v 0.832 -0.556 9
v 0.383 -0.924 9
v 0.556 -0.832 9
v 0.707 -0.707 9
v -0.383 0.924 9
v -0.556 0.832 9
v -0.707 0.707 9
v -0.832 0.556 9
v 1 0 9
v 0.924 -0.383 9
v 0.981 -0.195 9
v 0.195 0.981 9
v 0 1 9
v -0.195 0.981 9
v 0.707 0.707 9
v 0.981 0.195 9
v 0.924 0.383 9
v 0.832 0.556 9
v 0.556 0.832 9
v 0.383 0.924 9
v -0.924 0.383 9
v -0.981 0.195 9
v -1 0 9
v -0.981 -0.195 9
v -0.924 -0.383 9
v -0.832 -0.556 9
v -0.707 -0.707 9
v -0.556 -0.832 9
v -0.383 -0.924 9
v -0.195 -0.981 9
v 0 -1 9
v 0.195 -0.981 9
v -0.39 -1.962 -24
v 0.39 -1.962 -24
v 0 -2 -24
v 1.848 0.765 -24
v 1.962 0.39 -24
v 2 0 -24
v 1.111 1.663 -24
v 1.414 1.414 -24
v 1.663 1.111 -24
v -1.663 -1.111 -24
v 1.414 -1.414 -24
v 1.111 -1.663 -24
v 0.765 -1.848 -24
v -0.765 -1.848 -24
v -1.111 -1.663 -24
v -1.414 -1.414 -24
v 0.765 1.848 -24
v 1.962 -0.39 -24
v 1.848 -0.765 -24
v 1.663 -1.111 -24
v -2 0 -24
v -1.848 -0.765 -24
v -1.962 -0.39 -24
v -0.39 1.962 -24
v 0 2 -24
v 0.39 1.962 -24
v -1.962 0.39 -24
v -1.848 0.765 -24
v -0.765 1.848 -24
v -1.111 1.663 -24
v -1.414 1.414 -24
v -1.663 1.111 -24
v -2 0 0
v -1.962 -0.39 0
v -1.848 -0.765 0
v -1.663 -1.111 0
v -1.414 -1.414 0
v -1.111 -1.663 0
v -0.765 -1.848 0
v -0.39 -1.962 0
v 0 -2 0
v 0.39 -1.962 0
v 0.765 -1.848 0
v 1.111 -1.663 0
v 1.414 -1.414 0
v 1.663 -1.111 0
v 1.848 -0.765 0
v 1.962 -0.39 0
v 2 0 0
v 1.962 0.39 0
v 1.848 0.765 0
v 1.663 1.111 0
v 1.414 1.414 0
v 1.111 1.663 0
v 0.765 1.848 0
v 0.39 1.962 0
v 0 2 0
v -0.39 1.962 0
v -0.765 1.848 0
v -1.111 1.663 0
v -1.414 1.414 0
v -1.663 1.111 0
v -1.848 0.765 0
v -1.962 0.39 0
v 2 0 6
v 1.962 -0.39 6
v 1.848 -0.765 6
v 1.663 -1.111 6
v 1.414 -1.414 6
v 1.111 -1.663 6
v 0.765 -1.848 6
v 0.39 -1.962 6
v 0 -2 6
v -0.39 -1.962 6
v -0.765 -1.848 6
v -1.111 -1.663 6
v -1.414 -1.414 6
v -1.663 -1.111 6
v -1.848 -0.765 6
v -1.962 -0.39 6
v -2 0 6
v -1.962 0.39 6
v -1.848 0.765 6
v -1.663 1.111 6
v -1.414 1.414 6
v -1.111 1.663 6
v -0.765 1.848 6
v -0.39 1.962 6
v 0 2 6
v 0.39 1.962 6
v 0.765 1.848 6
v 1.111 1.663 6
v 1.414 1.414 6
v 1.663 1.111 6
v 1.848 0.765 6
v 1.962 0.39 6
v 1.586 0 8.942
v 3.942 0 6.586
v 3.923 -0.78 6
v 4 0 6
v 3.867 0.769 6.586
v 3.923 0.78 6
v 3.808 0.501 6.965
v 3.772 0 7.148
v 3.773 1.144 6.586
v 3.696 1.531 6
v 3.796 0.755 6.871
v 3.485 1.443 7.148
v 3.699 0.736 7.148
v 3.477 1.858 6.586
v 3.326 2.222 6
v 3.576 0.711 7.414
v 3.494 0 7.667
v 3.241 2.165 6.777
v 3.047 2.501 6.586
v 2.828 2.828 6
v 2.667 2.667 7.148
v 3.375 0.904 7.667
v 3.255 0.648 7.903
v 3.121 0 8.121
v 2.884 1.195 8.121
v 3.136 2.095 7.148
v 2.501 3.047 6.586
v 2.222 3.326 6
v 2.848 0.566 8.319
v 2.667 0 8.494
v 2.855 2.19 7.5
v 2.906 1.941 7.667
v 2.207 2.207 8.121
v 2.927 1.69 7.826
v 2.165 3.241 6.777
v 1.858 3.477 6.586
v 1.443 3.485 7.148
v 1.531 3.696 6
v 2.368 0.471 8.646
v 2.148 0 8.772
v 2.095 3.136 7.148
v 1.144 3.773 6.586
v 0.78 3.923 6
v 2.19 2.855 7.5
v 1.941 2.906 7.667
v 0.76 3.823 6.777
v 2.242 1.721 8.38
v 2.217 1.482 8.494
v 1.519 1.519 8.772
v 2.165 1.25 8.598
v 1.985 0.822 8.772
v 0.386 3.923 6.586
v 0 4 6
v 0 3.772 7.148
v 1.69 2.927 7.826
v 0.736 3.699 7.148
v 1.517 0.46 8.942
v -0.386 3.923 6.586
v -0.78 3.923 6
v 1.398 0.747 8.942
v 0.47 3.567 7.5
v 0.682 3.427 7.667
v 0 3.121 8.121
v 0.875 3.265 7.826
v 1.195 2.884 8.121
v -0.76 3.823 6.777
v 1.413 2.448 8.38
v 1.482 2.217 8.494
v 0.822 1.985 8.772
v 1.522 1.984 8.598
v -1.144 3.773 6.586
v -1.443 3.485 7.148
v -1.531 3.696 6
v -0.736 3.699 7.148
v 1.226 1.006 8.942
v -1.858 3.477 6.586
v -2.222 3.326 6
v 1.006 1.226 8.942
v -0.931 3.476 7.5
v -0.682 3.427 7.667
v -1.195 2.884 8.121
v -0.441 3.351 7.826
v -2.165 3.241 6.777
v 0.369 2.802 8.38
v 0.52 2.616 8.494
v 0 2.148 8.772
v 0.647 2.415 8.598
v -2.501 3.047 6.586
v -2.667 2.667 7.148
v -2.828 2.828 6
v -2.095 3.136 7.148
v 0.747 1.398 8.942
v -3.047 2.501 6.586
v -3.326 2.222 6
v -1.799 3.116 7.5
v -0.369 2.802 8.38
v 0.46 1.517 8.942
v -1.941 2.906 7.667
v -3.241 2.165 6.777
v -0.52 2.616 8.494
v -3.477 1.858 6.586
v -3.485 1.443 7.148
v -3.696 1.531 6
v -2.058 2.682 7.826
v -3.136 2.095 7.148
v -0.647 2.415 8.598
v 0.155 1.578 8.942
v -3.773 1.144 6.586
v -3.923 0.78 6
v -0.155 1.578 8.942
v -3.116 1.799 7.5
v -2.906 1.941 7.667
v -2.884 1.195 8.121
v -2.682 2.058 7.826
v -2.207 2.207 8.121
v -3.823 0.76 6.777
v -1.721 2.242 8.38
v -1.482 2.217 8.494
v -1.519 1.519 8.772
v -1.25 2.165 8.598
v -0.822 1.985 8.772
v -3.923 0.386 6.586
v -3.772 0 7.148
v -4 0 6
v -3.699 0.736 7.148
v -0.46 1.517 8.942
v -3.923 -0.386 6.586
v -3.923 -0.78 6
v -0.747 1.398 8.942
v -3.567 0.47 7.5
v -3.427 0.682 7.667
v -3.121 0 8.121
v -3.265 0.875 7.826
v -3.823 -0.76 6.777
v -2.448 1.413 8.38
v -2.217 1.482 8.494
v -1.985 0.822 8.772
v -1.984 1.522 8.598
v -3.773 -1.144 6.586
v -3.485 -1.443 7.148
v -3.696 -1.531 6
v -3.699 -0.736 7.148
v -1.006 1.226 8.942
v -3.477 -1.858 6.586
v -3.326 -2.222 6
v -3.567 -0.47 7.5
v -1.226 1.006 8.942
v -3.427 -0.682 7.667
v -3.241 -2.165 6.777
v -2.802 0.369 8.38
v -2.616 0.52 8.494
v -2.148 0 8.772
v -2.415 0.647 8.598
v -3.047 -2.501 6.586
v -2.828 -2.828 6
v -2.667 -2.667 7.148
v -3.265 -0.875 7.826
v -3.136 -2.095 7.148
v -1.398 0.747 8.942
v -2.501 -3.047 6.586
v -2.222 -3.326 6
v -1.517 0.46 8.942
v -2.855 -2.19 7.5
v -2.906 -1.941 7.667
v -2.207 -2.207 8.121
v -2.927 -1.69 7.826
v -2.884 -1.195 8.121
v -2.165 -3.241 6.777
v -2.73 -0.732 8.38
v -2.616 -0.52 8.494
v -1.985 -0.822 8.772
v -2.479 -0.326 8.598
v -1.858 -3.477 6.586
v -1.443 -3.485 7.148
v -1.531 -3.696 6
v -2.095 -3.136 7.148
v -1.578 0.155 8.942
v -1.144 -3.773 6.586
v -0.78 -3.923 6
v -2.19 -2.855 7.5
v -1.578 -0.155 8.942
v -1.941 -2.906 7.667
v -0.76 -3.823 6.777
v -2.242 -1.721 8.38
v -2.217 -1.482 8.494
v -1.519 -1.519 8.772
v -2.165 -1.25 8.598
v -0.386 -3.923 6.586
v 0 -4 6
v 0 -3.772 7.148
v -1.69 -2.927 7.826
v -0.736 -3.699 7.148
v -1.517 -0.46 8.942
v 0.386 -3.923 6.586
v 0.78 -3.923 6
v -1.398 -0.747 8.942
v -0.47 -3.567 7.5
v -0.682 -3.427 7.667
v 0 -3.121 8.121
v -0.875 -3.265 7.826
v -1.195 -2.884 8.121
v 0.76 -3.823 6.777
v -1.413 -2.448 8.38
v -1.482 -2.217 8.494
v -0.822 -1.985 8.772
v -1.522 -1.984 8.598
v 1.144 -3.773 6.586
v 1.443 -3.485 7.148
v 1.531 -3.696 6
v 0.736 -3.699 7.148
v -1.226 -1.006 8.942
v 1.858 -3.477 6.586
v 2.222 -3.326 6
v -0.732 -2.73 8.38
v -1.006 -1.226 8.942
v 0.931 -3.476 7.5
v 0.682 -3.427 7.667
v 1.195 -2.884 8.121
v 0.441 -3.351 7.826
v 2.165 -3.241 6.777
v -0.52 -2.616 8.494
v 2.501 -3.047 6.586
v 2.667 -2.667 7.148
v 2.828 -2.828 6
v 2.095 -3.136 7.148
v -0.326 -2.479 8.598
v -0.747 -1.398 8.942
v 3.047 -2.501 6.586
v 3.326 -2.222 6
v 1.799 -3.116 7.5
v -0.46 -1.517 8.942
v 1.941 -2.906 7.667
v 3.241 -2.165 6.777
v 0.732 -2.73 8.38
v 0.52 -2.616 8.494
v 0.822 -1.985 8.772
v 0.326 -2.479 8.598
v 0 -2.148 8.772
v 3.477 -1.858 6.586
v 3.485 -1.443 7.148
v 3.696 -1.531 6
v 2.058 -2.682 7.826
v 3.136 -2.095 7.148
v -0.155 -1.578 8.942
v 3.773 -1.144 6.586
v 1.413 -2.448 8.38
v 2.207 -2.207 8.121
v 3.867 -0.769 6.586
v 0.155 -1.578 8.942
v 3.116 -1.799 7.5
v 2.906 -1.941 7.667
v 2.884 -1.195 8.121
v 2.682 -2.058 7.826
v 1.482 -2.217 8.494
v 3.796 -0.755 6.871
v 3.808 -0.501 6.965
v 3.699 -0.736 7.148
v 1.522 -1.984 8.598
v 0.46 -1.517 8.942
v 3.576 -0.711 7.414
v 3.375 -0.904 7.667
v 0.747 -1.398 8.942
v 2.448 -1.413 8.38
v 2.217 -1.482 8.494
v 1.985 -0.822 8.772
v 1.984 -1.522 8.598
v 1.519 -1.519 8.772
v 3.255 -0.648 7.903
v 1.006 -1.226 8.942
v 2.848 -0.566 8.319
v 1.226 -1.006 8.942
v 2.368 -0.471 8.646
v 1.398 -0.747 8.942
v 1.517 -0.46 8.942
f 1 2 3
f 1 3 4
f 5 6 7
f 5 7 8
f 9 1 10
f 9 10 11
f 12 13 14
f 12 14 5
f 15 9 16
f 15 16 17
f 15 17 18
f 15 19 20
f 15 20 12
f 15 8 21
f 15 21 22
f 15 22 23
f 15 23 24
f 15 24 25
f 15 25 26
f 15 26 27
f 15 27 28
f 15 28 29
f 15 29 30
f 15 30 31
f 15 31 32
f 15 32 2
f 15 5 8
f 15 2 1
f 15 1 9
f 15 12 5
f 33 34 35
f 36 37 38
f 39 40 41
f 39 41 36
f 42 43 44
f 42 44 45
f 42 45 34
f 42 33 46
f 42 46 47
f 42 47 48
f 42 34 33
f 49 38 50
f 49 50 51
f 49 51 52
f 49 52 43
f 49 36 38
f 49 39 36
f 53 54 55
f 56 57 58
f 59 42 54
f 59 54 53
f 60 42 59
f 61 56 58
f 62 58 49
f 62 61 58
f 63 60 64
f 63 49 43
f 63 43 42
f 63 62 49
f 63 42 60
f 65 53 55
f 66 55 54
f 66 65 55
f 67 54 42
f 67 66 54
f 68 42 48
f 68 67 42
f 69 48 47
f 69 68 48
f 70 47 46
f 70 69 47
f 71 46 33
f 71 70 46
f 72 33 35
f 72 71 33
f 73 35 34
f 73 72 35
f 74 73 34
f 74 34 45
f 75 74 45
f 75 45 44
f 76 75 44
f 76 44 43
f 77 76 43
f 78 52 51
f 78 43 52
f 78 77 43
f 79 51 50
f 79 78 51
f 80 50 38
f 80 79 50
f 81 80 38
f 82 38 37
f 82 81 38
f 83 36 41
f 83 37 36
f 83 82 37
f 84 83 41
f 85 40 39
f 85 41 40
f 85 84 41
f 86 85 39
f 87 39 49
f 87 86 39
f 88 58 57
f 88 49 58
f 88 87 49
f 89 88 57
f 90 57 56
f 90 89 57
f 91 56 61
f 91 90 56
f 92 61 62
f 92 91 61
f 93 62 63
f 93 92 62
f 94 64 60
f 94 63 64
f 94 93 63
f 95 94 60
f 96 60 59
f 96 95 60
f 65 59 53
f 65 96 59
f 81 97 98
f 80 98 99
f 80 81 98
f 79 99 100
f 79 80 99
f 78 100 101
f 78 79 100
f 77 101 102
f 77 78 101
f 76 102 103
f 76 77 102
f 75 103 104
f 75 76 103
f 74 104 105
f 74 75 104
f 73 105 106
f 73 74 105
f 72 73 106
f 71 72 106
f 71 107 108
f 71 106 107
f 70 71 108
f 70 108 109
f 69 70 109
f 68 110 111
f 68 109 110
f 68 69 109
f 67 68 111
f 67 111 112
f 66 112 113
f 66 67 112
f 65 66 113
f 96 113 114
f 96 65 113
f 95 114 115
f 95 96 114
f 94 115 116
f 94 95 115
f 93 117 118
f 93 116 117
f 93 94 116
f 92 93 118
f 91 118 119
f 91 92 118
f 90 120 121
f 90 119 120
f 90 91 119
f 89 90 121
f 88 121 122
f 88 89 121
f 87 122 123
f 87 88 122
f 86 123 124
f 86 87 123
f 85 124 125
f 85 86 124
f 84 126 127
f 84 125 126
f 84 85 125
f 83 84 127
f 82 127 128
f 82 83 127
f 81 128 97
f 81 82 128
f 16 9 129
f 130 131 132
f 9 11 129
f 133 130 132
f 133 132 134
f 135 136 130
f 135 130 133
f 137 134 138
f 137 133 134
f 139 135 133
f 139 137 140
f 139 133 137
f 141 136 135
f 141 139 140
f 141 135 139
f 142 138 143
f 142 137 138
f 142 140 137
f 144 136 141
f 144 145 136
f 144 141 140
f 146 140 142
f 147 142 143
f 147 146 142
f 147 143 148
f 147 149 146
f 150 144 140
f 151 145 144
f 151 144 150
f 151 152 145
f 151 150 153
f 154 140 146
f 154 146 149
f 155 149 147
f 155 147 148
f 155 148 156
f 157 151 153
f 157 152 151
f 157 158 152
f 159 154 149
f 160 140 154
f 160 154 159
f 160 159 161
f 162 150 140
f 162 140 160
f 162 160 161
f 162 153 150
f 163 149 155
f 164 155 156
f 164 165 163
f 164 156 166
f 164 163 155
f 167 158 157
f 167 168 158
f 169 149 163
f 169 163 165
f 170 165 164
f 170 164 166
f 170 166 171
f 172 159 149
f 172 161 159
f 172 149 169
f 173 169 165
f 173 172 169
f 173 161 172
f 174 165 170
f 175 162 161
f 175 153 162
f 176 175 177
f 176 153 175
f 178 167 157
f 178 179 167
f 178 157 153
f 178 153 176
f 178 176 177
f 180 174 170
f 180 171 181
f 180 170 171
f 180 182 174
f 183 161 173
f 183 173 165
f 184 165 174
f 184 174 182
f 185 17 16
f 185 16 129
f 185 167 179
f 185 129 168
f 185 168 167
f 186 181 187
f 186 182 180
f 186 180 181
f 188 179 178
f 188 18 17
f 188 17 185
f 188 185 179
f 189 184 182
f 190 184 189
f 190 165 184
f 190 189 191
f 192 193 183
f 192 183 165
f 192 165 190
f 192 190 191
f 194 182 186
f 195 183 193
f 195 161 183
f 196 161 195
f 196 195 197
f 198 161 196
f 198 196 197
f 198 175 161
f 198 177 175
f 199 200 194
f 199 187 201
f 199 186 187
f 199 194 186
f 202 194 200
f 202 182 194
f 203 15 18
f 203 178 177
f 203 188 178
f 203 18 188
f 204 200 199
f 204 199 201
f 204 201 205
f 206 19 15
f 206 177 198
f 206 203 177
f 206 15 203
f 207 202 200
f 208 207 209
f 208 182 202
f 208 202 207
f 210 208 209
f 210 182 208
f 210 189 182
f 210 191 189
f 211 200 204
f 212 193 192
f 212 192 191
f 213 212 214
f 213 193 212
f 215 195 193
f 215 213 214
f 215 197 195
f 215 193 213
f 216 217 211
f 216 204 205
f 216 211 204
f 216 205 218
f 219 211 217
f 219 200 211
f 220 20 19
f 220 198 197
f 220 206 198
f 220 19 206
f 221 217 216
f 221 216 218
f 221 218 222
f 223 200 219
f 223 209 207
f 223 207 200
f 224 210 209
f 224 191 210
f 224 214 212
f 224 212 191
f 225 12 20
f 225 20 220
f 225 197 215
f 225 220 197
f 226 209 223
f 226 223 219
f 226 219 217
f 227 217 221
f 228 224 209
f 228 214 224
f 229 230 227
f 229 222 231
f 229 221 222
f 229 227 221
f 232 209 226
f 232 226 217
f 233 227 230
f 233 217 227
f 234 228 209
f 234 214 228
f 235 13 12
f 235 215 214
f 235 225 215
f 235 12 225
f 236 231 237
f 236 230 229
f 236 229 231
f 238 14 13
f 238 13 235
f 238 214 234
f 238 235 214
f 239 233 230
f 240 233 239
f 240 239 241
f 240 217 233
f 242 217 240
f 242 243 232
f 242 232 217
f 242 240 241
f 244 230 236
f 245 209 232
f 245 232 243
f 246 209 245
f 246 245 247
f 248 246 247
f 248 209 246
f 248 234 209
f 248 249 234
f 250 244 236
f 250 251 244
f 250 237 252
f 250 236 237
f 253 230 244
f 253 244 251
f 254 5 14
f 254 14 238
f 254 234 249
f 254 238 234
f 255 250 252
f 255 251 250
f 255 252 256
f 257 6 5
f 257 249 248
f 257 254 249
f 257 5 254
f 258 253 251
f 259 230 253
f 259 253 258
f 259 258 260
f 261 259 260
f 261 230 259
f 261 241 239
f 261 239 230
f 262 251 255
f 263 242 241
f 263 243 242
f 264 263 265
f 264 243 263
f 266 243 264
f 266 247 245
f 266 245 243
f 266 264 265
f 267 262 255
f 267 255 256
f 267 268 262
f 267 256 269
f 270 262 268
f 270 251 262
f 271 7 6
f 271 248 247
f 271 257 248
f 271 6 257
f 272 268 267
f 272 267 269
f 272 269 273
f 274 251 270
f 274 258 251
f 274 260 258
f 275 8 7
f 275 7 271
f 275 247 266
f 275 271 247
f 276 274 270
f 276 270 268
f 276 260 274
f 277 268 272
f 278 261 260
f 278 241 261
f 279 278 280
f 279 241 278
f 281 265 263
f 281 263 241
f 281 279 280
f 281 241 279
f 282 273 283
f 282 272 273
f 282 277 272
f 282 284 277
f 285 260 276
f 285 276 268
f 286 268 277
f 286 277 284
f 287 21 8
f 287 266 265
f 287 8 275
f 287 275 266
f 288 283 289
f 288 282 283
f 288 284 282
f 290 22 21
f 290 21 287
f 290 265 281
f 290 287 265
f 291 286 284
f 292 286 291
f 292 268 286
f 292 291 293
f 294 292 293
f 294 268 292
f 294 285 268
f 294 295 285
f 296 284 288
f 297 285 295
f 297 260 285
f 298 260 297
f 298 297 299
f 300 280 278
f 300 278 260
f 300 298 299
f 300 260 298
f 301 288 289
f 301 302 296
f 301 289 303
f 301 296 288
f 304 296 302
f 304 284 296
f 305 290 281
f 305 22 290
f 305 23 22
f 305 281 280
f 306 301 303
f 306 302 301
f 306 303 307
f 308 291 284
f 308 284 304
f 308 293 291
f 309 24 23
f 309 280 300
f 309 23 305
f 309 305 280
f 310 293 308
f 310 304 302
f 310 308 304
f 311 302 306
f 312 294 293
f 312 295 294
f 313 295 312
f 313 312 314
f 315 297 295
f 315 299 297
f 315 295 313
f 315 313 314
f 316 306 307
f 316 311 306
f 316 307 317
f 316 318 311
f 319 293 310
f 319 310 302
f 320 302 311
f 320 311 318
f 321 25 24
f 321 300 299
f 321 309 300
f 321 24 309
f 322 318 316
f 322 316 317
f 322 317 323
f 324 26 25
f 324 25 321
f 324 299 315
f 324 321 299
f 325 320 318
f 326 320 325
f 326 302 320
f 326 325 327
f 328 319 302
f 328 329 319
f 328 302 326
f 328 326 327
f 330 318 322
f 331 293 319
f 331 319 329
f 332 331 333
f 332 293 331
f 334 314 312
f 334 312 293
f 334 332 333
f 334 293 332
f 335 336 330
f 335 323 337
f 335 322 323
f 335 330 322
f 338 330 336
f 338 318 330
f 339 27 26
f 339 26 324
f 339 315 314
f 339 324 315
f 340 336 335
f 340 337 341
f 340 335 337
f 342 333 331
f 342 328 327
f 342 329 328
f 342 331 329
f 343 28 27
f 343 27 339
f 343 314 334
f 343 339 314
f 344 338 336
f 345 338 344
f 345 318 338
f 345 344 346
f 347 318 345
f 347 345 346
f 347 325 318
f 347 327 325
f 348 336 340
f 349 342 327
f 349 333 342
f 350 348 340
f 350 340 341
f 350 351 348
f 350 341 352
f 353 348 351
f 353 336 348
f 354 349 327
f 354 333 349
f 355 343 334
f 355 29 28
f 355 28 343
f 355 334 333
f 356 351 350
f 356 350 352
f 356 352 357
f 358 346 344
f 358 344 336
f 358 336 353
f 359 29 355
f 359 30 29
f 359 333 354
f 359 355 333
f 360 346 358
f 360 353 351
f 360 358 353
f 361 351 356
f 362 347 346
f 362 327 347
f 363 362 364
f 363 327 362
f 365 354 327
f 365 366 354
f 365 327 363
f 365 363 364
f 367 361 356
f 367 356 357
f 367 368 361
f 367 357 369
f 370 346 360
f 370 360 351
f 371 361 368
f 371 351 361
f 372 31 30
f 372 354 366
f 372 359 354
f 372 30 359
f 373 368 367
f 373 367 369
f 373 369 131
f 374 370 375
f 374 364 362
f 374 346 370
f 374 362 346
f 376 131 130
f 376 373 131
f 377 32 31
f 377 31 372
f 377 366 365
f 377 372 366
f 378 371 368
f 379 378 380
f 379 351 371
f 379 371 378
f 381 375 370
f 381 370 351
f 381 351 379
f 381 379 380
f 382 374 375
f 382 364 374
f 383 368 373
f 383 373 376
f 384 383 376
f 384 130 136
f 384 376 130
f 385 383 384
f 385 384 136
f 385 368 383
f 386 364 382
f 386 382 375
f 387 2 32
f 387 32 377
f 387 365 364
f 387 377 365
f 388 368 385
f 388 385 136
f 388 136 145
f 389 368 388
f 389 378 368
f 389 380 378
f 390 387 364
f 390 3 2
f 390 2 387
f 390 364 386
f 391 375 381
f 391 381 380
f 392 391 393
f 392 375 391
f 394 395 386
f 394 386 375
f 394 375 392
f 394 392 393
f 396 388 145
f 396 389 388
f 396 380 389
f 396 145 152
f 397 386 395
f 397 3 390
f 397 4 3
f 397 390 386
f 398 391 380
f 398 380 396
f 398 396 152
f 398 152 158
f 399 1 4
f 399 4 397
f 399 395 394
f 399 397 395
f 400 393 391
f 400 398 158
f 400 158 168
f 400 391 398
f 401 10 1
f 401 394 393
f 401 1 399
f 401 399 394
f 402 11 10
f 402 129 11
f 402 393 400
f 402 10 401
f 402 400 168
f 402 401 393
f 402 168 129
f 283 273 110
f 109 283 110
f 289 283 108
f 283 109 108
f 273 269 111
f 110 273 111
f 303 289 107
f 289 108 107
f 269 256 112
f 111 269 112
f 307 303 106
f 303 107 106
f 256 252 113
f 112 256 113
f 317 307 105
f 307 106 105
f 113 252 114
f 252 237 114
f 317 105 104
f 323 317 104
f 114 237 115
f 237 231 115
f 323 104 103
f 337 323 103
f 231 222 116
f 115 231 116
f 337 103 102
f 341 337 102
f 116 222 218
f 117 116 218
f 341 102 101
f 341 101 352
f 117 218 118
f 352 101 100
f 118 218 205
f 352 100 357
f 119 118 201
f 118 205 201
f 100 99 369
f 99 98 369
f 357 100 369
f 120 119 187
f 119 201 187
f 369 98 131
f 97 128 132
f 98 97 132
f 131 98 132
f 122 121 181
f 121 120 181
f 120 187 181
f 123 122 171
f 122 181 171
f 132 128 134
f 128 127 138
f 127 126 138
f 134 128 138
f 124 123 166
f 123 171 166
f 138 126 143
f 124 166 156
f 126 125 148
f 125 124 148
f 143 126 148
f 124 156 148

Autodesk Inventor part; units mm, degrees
ref_plane "YZ Plane" through (0, 0, 0) normal (1, 0, 0) x (0, 1, 0)
ref_plane "XZ Plane" through (0, 0, 0) normal (0, 1, 0) x (-1, 0, 0)
ref_plane "XY Plane" through (0, 0, 0) normal (0, 0, 1) x (1, 0, 0)
sketch "スケッチ1" plane through (0, 0, 0) normal (0, 0, 1) x (1, 0, 0)
  circle A0 centre (0, 0) radius 2
  dimension "d0" = 4
extrude "押し出し1" add sketch "スケッチ1" along normal blind 6
sketch "スケッチ2" plane through (0, 0, 6) normal (0, 0, 1) x (1, 0, 0)
  circle A0 centre (0, 0) radius 2 projected
  circle A1 centre (0, 0) radius 4
  dimension "d3" = 8
extrude "押し出し2" add sketch "スケッチ2" along normal blind 3 contours A0 | A1
fillet "フィレット1" radius 3 1 edges at (-4, 0, 9)
thread "ねじ1" size "M4x0.7" class "6g" standard "ANSI Metric M Profile" full length
sketch "スケッチ3" plane through (0, 0, 0) normal (0, 0, -1) x (-1, 0, 0)
  circle A0 centre (0, 0) radius 2
extrude "押し出し3" add sketch "スケッチ3" along normal blind 24
properties part number "SB　M4 30mm なべネジ" material "Stainless Steel, 440C"
